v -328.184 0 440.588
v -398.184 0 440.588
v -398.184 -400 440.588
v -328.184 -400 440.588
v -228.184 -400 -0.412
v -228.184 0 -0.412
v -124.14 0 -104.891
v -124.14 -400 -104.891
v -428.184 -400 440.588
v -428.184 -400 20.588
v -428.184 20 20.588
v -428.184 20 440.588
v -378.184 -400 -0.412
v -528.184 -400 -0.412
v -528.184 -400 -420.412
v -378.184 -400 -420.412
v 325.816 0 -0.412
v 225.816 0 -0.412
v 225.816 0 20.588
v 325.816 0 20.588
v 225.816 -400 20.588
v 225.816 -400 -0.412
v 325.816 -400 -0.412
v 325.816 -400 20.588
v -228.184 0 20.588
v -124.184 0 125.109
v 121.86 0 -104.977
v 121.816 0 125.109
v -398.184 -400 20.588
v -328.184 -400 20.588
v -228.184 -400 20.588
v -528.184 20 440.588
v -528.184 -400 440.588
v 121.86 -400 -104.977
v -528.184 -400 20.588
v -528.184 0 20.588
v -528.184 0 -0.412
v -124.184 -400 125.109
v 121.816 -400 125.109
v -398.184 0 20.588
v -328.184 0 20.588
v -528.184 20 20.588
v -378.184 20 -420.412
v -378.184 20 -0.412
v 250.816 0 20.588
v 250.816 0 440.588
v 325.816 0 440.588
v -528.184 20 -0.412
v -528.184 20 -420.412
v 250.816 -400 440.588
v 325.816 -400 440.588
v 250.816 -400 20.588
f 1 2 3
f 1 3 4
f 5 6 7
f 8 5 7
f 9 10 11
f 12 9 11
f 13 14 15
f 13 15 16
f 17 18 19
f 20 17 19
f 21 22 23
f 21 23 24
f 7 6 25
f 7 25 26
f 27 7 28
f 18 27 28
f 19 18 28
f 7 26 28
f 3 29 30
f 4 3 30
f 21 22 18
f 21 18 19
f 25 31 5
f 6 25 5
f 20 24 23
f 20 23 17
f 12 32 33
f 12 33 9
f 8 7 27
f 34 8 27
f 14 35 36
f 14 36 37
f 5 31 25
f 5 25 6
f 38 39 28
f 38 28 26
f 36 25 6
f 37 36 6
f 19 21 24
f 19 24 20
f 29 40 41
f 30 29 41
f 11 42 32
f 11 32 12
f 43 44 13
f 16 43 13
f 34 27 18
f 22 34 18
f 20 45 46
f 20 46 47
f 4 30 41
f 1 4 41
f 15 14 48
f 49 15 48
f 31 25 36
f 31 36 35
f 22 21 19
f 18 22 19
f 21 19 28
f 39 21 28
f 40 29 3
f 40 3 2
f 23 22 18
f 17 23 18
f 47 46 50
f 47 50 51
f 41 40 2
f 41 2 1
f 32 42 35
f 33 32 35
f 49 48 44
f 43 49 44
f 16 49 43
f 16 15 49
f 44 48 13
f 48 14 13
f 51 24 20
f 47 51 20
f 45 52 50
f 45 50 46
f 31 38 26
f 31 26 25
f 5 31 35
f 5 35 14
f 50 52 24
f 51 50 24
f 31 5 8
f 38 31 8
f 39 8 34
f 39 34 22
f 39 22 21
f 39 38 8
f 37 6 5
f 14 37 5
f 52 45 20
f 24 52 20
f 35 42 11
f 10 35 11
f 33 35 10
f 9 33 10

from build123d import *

# Parameters (mm, degrees)
F1_DEPTH  = 400
F2_W      = 400
F2_H      = 21
F3_DEPTH  = 100
F4_DEPTH  = 300
F5_W      = 100
F5_H      = 20
F5_H_2    = 400
F6_DEPTH  = 420
F7_W      = 70
F7_H      = 400
F8_DEPTH  = 420
F9_W      = 150
F9_H      = 20
F9_H_2    = 400
F10_DEPTH = 420
F11_W     = 75
F11_H     = 400
F12_DEPTH = 420


with BuildPart() as f1:
    # F0 (on Front) → F1 (new body)
    with BuildSketch(Plane.XZ):
        Polygon((-228.1835166094, -0.4122031702), (-124.140133619, -104.8906109595), (121.8598512371, -104.9769289125), (225.8164833906, -0.4122031702), (225.8164833906, 20.5877968298), (121.8164833906, 125.1093890405), (-124.1835166094, 125.1093890405), (-228.1835166094, 20.5877968298), align=None)
    extrude(amount=F1_DEPTH)


with BuildPart() as f3:
    # F2 (on face) → F3 (new body)
    with BuildSketch(Plane.YZ.offset(225.8164833906)):
        with Locations((-200, 10.0877968298)):
            Rectangle(F2_W, F2_H)
    extrude(amount=F3_DEPTH)


with BuildPart() as f4:
    # F4 (new): a face of the model
    f4_faces = [f1.part.faces().sort_by_distance(p)[0] for p in [
        (-228.1835166094, -200, 10.0877968298),
    ]]
    extrude(f4_faces, amount=F4_DEPTH)


with BuildPart() as f6:
    # F5 (on face) → F6 (new body)
    with BuildSketch(Plane.XY.offset(20.5877968298)):
        with Locations((-478.1835166094, 10)):
            Rectangle(F5_W, F5_H)
        with Locations((-478.1835166094, -200)):
            Rectangle(F5_W, F5_H_2)
    extrude(amount=F6_DEPTH)


with BuildPart() as f8:
    # F7 (on face) → F8 (new body, through all)
    with BuildSketch(Plane.XY.offset(20.5877968298)):
        with Locations((-363.1835166094, -200)):
            Rectangle(F7_W, F7_H)
    extrude(amount=F8_DEPTH)


with BuildPart() as f10:
    # F9 (on face) → F10 (new body)
    with BuildSketch(Plane(origin=(0, 0, -0.4122031702), x_dir=(1, 0, 0), z_dir=(0, 0, -1))):
        with Locations((-453.1835166094, -10)):
            Rectangle(F9_W, F9_H)
        with Locations((-453.1835166094, 200)):
            Rectangle(F9_W, F9_H_2)
    extrude(amount=F10_DEPTH)


with BuildPart() as f12:
    # F11 (on face) → F12 (new body, through all)
    with BuildSketch(Plane.XY.offset(20.5877968298)):
        with Locations((288.3164833906, -200)):
            Rectangle(F11_W, F11_H)
    extrude(amount=F12_DEPTH)


solid = Compound([f1.part, f3.part, f4.part, f6.part, f8.part, f10.part, f12.part])
